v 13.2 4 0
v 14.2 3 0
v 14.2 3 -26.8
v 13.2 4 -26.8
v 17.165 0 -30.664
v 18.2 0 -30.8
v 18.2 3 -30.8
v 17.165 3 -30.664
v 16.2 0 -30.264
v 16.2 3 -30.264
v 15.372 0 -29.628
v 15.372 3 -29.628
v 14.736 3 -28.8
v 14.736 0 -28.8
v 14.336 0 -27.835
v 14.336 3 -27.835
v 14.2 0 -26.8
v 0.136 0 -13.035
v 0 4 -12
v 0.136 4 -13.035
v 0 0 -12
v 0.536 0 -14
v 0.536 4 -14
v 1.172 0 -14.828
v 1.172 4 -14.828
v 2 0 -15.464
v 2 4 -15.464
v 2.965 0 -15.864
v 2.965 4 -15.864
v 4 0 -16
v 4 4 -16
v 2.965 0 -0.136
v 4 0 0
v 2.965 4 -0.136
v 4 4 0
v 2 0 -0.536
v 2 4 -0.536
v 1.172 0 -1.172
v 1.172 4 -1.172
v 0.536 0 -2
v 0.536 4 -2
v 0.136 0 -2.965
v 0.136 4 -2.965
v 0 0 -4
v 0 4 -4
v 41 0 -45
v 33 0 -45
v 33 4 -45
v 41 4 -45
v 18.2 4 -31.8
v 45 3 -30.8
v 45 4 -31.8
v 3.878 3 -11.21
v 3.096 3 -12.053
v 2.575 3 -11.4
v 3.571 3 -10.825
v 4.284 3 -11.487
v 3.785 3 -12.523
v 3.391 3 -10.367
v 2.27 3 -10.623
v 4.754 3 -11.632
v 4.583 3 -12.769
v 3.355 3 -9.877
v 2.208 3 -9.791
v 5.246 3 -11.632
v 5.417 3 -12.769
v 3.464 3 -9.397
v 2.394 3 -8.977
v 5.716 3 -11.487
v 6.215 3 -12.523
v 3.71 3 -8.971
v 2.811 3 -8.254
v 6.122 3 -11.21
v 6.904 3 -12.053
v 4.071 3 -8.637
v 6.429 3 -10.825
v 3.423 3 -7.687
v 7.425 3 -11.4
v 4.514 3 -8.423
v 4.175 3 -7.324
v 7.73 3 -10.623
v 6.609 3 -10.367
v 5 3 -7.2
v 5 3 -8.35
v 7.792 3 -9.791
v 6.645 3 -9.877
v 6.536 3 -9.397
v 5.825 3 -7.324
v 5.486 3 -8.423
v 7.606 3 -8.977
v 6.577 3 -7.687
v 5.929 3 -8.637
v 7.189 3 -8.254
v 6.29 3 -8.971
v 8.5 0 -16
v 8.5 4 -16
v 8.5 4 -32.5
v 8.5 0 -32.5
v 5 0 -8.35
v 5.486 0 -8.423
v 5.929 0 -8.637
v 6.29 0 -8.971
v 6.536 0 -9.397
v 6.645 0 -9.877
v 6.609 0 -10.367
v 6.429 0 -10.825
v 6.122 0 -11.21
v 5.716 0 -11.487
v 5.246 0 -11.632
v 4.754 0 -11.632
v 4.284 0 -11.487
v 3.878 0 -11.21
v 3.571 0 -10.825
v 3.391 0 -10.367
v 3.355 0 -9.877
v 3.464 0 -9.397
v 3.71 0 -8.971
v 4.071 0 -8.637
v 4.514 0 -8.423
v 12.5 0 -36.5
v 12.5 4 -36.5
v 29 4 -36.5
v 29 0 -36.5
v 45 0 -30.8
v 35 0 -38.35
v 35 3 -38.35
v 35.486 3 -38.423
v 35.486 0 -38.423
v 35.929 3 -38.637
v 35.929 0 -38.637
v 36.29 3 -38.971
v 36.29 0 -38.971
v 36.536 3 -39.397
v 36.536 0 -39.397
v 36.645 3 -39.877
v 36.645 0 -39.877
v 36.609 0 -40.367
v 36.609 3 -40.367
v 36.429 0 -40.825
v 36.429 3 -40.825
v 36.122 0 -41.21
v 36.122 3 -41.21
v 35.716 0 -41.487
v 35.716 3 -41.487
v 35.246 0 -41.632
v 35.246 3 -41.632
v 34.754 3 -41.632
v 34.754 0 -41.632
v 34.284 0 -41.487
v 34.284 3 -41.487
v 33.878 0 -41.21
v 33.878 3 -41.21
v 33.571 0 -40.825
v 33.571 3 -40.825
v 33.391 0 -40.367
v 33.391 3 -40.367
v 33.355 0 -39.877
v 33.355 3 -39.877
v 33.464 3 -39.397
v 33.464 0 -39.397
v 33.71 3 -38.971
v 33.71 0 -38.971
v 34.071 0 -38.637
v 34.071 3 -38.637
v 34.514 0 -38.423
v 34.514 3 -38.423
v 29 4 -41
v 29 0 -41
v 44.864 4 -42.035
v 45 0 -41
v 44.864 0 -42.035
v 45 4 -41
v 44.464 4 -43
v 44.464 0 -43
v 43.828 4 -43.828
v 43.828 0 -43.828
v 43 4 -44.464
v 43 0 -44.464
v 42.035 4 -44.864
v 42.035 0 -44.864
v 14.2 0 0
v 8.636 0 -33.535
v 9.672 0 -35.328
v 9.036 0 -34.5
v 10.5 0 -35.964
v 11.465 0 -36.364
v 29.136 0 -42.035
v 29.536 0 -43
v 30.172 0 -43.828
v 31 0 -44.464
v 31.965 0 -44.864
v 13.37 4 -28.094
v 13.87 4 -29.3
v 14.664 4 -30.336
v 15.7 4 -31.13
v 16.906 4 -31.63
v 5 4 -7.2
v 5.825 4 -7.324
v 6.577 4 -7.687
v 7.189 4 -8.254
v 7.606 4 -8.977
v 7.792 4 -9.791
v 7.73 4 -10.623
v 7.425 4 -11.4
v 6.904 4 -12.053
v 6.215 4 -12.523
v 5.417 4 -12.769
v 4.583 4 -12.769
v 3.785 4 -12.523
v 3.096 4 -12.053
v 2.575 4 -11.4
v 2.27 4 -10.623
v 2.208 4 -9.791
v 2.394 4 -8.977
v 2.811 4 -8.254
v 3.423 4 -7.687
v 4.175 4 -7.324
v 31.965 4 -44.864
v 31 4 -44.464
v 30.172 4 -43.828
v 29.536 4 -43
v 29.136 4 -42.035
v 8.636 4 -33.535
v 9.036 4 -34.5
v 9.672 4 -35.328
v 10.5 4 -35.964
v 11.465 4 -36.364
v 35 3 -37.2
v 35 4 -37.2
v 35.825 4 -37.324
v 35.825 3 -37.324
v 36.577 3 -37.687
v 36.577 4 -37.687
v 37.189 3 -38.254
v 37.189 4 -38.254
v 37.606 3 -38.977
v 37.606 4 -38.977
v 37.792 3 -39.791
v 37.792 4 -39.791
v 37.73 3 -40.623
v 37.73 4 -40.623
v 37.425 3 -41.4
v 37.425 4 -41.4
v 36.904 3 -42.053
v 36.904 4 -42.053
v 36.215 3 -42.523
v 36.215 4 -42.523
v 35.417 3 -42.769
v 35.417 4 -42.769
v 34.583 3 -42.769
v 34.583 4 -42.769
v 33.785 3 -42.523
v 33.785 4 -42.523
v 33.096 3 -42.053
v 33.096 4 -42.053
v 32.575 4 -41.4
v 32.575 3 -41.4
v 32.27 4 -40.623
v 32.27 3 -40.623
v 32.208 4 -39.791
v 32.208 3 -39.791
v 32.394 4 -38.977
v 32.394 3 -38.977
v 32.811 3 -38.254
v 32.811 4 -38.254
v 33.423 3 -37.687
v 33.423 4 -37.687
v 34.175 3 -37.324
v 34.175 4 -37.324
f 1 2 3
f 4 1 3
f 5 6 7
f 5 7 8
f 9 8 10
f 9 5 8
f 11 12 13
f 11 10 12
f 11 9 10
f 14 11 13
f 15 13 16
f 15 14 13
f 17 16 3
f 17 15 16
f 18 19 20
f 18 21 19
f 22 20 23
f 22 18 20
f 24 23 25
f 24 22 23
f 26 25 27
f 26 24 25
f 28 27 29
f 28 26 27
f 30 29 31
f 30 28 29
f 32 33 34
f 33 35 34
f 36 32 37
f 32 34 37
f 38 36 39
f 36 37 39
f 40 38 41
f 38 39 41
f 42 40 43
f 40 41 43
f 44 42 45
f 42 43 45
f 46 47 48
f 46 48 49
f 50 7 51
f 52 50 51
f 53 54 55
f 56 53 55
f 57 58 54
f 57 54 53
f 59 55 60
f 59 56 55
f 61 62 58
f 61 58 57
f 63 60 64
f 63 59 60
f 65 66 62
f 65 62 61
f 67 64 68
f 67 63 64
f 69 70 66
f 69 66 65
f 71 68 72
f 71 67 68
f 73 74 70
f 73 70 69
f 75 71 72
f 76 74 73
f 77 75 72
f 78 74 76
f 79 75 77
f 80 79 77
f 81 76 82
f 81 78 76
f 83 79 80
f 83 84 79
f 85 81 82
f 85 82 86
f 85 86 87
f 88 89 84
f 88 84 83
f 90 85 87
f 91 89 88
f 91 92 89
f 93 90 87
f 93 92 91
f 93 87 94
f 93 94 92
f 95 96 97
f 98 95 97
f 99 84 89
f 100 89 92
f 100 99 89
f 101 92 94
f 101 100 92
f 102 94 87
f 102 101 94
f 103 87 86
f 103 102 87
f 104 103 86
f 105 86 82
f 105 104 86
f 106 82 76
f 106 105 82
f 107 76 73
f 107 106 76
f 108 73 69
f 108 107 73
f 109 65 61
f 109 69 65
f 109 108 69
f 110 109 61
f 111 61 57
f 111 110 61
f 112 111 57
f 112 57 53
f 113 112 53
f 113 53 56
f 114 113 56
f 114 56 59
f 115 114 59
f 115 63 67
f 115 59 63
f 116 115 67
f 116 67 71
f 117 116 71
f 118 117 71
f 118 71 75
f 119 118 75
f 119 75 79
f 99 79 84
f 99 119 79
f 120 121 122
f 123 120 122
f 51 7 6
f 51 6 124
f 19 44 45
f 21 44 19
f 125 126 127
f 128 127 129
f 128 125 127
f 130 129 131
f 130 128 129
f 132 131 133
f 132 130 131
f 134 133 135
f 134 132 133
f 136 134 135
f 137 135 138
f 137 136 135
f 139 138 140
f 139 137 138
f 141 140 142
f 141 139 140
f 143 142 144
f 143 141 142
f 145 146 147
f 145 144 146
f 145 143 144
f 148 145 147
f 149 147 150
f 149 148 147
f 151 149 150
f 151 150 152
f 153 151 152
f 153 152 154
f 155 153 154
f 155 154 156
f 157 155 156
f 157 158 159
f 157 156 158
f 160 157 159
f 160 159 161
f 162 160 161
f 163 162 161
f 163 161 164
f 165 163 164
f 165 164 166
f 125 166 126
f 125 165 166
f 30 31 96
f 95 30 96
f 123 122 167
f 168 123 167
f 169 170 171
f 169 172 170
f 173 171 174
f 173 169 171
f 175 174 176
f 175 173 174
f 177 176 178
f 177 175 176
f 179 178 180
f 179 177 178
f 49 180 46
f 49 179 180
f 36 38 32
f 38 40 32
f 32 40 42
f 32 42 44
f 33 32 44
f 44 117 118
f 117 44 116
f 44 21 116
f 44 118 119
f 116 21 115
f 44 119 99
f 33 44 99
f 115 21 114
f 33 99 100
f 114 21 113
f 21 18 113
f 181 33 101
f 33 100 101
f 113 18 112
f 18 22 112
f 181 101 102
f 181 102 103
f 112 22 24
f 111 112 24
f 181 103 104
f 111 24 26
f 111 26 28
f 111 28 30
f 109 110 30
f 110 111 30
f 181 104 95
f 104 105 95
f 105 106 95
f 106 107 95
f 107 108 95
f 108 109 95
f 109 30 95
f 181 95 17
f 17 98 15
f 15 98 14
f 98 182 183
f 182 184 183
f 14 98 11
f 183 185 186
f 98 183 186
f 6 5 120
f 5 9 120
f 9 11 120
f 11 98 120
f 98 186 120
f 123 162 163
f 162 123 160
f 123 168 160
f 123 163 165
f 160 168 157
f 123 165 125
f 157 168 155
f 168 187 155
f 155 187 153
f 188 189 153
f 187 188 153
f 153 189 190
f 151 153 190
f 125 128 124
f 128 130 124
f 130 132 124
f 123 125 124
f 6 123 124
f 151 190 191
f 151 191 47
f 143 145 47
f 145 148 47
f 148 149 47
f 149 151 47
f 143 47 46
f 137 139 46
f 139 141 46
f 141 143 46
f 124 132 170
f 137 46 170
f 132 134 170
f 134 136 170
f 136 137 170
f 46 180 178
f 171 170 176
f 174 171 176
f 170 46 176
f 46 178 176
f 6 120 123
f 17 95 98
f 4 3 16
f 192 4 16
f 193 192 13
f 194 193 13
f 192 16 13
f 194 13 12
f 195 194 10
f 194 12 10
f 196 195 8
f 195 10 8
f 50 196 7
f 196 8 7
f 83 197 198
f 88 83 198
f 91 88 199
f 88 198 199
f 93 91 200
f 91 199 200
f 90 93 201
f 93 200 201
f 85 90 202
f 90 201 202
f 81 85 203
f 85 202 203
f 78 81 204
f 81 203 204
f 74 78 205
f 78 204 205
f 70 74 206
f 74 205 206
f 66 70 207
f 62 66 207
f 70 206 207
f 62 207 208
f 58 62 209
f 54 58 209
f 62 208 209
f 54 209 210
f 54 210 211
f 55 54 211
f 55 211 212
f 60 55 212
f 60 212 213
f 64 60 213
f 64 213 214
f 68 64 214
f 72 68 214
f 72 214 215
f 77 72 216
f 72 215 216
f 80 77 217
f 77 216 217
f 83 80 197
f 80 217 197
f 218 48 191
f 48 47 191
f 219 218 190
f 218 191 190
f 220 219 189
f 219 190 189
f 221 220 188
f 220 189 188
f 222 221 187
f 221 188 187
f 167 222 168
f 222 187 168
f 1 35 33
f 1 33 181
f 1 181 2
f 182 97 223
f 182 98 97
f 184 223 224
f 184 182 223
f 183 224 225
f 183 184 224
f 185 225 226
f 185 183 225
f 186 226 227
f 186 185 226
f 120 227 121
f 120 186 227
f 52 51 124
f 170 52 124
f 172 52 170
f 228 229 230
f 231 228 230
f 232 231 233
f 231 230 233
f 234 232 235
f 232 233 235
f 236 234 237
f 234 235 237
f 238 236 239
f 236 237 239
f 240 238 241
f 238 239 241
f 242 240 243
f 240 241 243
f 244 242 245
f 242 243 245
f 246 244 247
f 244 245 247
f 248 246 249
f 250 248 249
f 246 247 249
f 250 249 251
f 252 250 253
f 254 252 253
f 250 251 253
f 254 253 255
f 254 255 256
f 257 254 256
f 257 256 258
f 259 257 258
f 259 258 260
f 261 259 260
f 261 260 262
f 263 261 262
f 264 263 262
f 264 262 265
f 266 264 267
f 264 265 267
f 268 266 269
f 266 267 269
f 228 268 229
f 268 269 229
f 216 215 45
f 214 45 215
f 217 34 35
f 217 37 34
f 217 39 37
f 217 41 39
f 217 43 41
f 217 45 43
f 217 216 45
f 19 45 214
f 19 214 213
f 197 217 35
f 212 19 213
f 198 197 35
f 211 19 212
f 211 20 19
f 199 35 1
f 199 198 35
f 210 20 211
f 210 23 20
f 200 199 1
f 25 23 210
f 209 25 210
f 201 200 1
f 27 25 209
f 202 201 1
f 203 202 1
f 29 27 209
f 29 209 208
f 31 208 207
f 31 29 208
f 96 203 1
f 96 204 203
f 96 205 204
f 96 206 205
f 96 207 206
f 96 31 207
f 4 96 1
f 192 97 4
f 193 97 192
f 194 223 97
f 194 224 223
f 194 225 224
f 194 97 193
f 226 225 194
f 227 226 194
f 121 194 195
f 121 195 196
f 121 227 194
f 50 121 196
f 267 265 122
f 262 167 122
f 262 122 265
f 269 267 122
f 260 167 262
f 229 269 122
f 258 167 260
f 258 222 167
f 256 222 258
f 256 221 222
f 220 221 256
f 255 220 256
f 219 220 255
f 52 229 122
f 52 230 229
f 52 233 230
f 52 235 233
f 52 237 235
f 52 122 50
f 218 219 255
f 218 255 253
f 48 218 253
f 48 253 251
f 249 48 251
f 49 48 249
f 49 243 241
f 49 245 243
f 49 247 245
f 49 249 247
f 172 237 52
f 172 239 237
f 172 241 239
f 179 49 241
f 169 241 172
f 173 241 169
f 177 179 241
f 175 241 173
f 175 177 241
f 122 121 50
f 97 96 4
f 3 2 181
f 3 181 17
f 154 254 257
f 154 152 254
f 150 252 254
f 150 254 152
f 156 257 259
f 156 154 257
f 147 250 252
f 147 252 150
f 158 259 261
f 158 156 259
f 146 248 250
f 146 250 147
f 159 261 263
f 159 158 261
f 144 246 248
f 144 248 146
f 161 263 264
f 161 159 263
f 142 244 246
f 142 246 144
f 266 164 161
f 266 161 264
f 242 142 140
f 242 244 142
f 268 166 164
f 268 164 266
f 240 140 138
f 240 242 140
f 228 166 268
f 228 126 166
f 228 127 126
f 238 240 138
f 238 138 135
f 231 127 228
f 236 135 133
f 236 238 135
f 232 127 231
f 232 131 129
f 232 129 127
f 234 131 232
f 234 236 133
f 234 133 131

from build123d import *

# Parameters (mm, degrees)
CROQUIS1_R              = 1.65
SALIENTE_EXTRUIR1_DEPTH = 4
CROQUIS2_W              = 30.8
CROQUIS2_H              = 4.2
SALIENTE_EXTRUIR2_DEPTH = 4
CROQUIS3_W              = 8.5
CROQUIS3_H              = 20.5
CORTAR_EXTRUIR1_DEPTH   = 4
REDONDEO1_R             = 4
REDONDEO2_R             = 4
CHAFL_N1_SIZE           = 1
CROQUIS4_R              = 2.8
CORTAR_EXTRUIR2_DEPTH   = 1


with BuildPart() as part:
    # Croquis1 → Saliente-Extruir1 (new body)
    with BuildSketch(Plane(origin=(0, 0, 0), x_dir=(1, 0, 0), z_dir=(0, 1, 0))):
        Polygon((0, 0), (0, 45), (45, 45), (45, 35), (10, 35), (10, 0), align=None)
        with Locations(Location((35, 40, 0), (0, 0, 270))):
            Circle(CROQUIS1_R, mode=Mode.SUBTRACT)
        with Locations(Location((5, 10, 0), (0, 0, 270))):
            Circle(CROQUIS1_R, mode=Mode.SUBTRACT)
    extrude(amount=SALIENTE_EXTRUIR1_DEPTH)

    # Croquis2 → Saliente-Extruir2 (add)
    with BuildSketch(Plane(origin=(0, 4, 0), x_dir=(1, 0, 0), z_dir=(0, 1, 0))):
        with Locations((29.6, 32.9)):
            Rectangle(CROQUIS2_W, CROQUIS2_H)
        Polygon((10, 35), (10, 0), (14.2, 0), (14.2, 30.8), (14.2, 35), align=None)
    extrude(amount=-SALIENTE_EXTRUIR2_DEPTH)

    # Croquis3 → Cortar-Extruir1 (cut)
    with BuildSketch(Plane(origin=(0, 4, 0), x_dir=(1, 0, 0), z_dir=(0, 1, 0))):
        Polygon((29, 45), (0, 45), (0, 36.5), (8.5, 36.5), (29, 36.5), align=None)
        with Locations((4.25, 26.25)):
            Rectangle(CROQUIS3_W, CROQUIS3_H)
    extrude(amount=-CORTAR_EXTRUIR1_DEPTH, mode=Mode.SUBTRACT)

    # Redondeo1
    redondeo1_edges = [part.edges().sort_by_distance(p)[0] for p in [
        (14.2, 2, -30.8),
        (8.5, 2, -36.5),
    ]]
    fillet(redondeo1_edges, radius=REDONDEO1_R)

    # Redondeo2
    redondeo2_edges = [part.edges().sort_by_distance(p)[0] for p in [
        (0, 2, 0),
        (45, 2, -45),
        (0, 2, -16),
        (29, 2, -45),
    ]]
    fillet(redondeo2_edges, radius=REDONDEO2_R)

    # Chaflán1
    chafl_n1_edges = [part.edges().sort_by_distance(p)[0] for p in [
        (31.6, 4, -30.8),
        (14.2, 4, -13.4),
        (15.371572875, 4, -29.628427125),
    ]]
    chamfer(chafl_n1_edges, length=CHAFL_N1_SIZE)

    # Croquis4 → Cortar-Extruir2 (cut)
    with BuildSketch(Plane(origin=(0, 4, 0), x_dir=(1, 0, 0), z_dir=(0, 1, 0))):
        with Locations(Location((35, 40, 0), (0, 0, 270))):
            Circle(CROQUIS4_R)
        with Locations(Location((5, 10, 0), (0, 0, 270))):
            Circle(CROQUIS4_R)
    extrude(amount=-CORTAR_EXTRUIR2_DEPTH, mode=Mode.SUBTRACT)


solid = part.part
